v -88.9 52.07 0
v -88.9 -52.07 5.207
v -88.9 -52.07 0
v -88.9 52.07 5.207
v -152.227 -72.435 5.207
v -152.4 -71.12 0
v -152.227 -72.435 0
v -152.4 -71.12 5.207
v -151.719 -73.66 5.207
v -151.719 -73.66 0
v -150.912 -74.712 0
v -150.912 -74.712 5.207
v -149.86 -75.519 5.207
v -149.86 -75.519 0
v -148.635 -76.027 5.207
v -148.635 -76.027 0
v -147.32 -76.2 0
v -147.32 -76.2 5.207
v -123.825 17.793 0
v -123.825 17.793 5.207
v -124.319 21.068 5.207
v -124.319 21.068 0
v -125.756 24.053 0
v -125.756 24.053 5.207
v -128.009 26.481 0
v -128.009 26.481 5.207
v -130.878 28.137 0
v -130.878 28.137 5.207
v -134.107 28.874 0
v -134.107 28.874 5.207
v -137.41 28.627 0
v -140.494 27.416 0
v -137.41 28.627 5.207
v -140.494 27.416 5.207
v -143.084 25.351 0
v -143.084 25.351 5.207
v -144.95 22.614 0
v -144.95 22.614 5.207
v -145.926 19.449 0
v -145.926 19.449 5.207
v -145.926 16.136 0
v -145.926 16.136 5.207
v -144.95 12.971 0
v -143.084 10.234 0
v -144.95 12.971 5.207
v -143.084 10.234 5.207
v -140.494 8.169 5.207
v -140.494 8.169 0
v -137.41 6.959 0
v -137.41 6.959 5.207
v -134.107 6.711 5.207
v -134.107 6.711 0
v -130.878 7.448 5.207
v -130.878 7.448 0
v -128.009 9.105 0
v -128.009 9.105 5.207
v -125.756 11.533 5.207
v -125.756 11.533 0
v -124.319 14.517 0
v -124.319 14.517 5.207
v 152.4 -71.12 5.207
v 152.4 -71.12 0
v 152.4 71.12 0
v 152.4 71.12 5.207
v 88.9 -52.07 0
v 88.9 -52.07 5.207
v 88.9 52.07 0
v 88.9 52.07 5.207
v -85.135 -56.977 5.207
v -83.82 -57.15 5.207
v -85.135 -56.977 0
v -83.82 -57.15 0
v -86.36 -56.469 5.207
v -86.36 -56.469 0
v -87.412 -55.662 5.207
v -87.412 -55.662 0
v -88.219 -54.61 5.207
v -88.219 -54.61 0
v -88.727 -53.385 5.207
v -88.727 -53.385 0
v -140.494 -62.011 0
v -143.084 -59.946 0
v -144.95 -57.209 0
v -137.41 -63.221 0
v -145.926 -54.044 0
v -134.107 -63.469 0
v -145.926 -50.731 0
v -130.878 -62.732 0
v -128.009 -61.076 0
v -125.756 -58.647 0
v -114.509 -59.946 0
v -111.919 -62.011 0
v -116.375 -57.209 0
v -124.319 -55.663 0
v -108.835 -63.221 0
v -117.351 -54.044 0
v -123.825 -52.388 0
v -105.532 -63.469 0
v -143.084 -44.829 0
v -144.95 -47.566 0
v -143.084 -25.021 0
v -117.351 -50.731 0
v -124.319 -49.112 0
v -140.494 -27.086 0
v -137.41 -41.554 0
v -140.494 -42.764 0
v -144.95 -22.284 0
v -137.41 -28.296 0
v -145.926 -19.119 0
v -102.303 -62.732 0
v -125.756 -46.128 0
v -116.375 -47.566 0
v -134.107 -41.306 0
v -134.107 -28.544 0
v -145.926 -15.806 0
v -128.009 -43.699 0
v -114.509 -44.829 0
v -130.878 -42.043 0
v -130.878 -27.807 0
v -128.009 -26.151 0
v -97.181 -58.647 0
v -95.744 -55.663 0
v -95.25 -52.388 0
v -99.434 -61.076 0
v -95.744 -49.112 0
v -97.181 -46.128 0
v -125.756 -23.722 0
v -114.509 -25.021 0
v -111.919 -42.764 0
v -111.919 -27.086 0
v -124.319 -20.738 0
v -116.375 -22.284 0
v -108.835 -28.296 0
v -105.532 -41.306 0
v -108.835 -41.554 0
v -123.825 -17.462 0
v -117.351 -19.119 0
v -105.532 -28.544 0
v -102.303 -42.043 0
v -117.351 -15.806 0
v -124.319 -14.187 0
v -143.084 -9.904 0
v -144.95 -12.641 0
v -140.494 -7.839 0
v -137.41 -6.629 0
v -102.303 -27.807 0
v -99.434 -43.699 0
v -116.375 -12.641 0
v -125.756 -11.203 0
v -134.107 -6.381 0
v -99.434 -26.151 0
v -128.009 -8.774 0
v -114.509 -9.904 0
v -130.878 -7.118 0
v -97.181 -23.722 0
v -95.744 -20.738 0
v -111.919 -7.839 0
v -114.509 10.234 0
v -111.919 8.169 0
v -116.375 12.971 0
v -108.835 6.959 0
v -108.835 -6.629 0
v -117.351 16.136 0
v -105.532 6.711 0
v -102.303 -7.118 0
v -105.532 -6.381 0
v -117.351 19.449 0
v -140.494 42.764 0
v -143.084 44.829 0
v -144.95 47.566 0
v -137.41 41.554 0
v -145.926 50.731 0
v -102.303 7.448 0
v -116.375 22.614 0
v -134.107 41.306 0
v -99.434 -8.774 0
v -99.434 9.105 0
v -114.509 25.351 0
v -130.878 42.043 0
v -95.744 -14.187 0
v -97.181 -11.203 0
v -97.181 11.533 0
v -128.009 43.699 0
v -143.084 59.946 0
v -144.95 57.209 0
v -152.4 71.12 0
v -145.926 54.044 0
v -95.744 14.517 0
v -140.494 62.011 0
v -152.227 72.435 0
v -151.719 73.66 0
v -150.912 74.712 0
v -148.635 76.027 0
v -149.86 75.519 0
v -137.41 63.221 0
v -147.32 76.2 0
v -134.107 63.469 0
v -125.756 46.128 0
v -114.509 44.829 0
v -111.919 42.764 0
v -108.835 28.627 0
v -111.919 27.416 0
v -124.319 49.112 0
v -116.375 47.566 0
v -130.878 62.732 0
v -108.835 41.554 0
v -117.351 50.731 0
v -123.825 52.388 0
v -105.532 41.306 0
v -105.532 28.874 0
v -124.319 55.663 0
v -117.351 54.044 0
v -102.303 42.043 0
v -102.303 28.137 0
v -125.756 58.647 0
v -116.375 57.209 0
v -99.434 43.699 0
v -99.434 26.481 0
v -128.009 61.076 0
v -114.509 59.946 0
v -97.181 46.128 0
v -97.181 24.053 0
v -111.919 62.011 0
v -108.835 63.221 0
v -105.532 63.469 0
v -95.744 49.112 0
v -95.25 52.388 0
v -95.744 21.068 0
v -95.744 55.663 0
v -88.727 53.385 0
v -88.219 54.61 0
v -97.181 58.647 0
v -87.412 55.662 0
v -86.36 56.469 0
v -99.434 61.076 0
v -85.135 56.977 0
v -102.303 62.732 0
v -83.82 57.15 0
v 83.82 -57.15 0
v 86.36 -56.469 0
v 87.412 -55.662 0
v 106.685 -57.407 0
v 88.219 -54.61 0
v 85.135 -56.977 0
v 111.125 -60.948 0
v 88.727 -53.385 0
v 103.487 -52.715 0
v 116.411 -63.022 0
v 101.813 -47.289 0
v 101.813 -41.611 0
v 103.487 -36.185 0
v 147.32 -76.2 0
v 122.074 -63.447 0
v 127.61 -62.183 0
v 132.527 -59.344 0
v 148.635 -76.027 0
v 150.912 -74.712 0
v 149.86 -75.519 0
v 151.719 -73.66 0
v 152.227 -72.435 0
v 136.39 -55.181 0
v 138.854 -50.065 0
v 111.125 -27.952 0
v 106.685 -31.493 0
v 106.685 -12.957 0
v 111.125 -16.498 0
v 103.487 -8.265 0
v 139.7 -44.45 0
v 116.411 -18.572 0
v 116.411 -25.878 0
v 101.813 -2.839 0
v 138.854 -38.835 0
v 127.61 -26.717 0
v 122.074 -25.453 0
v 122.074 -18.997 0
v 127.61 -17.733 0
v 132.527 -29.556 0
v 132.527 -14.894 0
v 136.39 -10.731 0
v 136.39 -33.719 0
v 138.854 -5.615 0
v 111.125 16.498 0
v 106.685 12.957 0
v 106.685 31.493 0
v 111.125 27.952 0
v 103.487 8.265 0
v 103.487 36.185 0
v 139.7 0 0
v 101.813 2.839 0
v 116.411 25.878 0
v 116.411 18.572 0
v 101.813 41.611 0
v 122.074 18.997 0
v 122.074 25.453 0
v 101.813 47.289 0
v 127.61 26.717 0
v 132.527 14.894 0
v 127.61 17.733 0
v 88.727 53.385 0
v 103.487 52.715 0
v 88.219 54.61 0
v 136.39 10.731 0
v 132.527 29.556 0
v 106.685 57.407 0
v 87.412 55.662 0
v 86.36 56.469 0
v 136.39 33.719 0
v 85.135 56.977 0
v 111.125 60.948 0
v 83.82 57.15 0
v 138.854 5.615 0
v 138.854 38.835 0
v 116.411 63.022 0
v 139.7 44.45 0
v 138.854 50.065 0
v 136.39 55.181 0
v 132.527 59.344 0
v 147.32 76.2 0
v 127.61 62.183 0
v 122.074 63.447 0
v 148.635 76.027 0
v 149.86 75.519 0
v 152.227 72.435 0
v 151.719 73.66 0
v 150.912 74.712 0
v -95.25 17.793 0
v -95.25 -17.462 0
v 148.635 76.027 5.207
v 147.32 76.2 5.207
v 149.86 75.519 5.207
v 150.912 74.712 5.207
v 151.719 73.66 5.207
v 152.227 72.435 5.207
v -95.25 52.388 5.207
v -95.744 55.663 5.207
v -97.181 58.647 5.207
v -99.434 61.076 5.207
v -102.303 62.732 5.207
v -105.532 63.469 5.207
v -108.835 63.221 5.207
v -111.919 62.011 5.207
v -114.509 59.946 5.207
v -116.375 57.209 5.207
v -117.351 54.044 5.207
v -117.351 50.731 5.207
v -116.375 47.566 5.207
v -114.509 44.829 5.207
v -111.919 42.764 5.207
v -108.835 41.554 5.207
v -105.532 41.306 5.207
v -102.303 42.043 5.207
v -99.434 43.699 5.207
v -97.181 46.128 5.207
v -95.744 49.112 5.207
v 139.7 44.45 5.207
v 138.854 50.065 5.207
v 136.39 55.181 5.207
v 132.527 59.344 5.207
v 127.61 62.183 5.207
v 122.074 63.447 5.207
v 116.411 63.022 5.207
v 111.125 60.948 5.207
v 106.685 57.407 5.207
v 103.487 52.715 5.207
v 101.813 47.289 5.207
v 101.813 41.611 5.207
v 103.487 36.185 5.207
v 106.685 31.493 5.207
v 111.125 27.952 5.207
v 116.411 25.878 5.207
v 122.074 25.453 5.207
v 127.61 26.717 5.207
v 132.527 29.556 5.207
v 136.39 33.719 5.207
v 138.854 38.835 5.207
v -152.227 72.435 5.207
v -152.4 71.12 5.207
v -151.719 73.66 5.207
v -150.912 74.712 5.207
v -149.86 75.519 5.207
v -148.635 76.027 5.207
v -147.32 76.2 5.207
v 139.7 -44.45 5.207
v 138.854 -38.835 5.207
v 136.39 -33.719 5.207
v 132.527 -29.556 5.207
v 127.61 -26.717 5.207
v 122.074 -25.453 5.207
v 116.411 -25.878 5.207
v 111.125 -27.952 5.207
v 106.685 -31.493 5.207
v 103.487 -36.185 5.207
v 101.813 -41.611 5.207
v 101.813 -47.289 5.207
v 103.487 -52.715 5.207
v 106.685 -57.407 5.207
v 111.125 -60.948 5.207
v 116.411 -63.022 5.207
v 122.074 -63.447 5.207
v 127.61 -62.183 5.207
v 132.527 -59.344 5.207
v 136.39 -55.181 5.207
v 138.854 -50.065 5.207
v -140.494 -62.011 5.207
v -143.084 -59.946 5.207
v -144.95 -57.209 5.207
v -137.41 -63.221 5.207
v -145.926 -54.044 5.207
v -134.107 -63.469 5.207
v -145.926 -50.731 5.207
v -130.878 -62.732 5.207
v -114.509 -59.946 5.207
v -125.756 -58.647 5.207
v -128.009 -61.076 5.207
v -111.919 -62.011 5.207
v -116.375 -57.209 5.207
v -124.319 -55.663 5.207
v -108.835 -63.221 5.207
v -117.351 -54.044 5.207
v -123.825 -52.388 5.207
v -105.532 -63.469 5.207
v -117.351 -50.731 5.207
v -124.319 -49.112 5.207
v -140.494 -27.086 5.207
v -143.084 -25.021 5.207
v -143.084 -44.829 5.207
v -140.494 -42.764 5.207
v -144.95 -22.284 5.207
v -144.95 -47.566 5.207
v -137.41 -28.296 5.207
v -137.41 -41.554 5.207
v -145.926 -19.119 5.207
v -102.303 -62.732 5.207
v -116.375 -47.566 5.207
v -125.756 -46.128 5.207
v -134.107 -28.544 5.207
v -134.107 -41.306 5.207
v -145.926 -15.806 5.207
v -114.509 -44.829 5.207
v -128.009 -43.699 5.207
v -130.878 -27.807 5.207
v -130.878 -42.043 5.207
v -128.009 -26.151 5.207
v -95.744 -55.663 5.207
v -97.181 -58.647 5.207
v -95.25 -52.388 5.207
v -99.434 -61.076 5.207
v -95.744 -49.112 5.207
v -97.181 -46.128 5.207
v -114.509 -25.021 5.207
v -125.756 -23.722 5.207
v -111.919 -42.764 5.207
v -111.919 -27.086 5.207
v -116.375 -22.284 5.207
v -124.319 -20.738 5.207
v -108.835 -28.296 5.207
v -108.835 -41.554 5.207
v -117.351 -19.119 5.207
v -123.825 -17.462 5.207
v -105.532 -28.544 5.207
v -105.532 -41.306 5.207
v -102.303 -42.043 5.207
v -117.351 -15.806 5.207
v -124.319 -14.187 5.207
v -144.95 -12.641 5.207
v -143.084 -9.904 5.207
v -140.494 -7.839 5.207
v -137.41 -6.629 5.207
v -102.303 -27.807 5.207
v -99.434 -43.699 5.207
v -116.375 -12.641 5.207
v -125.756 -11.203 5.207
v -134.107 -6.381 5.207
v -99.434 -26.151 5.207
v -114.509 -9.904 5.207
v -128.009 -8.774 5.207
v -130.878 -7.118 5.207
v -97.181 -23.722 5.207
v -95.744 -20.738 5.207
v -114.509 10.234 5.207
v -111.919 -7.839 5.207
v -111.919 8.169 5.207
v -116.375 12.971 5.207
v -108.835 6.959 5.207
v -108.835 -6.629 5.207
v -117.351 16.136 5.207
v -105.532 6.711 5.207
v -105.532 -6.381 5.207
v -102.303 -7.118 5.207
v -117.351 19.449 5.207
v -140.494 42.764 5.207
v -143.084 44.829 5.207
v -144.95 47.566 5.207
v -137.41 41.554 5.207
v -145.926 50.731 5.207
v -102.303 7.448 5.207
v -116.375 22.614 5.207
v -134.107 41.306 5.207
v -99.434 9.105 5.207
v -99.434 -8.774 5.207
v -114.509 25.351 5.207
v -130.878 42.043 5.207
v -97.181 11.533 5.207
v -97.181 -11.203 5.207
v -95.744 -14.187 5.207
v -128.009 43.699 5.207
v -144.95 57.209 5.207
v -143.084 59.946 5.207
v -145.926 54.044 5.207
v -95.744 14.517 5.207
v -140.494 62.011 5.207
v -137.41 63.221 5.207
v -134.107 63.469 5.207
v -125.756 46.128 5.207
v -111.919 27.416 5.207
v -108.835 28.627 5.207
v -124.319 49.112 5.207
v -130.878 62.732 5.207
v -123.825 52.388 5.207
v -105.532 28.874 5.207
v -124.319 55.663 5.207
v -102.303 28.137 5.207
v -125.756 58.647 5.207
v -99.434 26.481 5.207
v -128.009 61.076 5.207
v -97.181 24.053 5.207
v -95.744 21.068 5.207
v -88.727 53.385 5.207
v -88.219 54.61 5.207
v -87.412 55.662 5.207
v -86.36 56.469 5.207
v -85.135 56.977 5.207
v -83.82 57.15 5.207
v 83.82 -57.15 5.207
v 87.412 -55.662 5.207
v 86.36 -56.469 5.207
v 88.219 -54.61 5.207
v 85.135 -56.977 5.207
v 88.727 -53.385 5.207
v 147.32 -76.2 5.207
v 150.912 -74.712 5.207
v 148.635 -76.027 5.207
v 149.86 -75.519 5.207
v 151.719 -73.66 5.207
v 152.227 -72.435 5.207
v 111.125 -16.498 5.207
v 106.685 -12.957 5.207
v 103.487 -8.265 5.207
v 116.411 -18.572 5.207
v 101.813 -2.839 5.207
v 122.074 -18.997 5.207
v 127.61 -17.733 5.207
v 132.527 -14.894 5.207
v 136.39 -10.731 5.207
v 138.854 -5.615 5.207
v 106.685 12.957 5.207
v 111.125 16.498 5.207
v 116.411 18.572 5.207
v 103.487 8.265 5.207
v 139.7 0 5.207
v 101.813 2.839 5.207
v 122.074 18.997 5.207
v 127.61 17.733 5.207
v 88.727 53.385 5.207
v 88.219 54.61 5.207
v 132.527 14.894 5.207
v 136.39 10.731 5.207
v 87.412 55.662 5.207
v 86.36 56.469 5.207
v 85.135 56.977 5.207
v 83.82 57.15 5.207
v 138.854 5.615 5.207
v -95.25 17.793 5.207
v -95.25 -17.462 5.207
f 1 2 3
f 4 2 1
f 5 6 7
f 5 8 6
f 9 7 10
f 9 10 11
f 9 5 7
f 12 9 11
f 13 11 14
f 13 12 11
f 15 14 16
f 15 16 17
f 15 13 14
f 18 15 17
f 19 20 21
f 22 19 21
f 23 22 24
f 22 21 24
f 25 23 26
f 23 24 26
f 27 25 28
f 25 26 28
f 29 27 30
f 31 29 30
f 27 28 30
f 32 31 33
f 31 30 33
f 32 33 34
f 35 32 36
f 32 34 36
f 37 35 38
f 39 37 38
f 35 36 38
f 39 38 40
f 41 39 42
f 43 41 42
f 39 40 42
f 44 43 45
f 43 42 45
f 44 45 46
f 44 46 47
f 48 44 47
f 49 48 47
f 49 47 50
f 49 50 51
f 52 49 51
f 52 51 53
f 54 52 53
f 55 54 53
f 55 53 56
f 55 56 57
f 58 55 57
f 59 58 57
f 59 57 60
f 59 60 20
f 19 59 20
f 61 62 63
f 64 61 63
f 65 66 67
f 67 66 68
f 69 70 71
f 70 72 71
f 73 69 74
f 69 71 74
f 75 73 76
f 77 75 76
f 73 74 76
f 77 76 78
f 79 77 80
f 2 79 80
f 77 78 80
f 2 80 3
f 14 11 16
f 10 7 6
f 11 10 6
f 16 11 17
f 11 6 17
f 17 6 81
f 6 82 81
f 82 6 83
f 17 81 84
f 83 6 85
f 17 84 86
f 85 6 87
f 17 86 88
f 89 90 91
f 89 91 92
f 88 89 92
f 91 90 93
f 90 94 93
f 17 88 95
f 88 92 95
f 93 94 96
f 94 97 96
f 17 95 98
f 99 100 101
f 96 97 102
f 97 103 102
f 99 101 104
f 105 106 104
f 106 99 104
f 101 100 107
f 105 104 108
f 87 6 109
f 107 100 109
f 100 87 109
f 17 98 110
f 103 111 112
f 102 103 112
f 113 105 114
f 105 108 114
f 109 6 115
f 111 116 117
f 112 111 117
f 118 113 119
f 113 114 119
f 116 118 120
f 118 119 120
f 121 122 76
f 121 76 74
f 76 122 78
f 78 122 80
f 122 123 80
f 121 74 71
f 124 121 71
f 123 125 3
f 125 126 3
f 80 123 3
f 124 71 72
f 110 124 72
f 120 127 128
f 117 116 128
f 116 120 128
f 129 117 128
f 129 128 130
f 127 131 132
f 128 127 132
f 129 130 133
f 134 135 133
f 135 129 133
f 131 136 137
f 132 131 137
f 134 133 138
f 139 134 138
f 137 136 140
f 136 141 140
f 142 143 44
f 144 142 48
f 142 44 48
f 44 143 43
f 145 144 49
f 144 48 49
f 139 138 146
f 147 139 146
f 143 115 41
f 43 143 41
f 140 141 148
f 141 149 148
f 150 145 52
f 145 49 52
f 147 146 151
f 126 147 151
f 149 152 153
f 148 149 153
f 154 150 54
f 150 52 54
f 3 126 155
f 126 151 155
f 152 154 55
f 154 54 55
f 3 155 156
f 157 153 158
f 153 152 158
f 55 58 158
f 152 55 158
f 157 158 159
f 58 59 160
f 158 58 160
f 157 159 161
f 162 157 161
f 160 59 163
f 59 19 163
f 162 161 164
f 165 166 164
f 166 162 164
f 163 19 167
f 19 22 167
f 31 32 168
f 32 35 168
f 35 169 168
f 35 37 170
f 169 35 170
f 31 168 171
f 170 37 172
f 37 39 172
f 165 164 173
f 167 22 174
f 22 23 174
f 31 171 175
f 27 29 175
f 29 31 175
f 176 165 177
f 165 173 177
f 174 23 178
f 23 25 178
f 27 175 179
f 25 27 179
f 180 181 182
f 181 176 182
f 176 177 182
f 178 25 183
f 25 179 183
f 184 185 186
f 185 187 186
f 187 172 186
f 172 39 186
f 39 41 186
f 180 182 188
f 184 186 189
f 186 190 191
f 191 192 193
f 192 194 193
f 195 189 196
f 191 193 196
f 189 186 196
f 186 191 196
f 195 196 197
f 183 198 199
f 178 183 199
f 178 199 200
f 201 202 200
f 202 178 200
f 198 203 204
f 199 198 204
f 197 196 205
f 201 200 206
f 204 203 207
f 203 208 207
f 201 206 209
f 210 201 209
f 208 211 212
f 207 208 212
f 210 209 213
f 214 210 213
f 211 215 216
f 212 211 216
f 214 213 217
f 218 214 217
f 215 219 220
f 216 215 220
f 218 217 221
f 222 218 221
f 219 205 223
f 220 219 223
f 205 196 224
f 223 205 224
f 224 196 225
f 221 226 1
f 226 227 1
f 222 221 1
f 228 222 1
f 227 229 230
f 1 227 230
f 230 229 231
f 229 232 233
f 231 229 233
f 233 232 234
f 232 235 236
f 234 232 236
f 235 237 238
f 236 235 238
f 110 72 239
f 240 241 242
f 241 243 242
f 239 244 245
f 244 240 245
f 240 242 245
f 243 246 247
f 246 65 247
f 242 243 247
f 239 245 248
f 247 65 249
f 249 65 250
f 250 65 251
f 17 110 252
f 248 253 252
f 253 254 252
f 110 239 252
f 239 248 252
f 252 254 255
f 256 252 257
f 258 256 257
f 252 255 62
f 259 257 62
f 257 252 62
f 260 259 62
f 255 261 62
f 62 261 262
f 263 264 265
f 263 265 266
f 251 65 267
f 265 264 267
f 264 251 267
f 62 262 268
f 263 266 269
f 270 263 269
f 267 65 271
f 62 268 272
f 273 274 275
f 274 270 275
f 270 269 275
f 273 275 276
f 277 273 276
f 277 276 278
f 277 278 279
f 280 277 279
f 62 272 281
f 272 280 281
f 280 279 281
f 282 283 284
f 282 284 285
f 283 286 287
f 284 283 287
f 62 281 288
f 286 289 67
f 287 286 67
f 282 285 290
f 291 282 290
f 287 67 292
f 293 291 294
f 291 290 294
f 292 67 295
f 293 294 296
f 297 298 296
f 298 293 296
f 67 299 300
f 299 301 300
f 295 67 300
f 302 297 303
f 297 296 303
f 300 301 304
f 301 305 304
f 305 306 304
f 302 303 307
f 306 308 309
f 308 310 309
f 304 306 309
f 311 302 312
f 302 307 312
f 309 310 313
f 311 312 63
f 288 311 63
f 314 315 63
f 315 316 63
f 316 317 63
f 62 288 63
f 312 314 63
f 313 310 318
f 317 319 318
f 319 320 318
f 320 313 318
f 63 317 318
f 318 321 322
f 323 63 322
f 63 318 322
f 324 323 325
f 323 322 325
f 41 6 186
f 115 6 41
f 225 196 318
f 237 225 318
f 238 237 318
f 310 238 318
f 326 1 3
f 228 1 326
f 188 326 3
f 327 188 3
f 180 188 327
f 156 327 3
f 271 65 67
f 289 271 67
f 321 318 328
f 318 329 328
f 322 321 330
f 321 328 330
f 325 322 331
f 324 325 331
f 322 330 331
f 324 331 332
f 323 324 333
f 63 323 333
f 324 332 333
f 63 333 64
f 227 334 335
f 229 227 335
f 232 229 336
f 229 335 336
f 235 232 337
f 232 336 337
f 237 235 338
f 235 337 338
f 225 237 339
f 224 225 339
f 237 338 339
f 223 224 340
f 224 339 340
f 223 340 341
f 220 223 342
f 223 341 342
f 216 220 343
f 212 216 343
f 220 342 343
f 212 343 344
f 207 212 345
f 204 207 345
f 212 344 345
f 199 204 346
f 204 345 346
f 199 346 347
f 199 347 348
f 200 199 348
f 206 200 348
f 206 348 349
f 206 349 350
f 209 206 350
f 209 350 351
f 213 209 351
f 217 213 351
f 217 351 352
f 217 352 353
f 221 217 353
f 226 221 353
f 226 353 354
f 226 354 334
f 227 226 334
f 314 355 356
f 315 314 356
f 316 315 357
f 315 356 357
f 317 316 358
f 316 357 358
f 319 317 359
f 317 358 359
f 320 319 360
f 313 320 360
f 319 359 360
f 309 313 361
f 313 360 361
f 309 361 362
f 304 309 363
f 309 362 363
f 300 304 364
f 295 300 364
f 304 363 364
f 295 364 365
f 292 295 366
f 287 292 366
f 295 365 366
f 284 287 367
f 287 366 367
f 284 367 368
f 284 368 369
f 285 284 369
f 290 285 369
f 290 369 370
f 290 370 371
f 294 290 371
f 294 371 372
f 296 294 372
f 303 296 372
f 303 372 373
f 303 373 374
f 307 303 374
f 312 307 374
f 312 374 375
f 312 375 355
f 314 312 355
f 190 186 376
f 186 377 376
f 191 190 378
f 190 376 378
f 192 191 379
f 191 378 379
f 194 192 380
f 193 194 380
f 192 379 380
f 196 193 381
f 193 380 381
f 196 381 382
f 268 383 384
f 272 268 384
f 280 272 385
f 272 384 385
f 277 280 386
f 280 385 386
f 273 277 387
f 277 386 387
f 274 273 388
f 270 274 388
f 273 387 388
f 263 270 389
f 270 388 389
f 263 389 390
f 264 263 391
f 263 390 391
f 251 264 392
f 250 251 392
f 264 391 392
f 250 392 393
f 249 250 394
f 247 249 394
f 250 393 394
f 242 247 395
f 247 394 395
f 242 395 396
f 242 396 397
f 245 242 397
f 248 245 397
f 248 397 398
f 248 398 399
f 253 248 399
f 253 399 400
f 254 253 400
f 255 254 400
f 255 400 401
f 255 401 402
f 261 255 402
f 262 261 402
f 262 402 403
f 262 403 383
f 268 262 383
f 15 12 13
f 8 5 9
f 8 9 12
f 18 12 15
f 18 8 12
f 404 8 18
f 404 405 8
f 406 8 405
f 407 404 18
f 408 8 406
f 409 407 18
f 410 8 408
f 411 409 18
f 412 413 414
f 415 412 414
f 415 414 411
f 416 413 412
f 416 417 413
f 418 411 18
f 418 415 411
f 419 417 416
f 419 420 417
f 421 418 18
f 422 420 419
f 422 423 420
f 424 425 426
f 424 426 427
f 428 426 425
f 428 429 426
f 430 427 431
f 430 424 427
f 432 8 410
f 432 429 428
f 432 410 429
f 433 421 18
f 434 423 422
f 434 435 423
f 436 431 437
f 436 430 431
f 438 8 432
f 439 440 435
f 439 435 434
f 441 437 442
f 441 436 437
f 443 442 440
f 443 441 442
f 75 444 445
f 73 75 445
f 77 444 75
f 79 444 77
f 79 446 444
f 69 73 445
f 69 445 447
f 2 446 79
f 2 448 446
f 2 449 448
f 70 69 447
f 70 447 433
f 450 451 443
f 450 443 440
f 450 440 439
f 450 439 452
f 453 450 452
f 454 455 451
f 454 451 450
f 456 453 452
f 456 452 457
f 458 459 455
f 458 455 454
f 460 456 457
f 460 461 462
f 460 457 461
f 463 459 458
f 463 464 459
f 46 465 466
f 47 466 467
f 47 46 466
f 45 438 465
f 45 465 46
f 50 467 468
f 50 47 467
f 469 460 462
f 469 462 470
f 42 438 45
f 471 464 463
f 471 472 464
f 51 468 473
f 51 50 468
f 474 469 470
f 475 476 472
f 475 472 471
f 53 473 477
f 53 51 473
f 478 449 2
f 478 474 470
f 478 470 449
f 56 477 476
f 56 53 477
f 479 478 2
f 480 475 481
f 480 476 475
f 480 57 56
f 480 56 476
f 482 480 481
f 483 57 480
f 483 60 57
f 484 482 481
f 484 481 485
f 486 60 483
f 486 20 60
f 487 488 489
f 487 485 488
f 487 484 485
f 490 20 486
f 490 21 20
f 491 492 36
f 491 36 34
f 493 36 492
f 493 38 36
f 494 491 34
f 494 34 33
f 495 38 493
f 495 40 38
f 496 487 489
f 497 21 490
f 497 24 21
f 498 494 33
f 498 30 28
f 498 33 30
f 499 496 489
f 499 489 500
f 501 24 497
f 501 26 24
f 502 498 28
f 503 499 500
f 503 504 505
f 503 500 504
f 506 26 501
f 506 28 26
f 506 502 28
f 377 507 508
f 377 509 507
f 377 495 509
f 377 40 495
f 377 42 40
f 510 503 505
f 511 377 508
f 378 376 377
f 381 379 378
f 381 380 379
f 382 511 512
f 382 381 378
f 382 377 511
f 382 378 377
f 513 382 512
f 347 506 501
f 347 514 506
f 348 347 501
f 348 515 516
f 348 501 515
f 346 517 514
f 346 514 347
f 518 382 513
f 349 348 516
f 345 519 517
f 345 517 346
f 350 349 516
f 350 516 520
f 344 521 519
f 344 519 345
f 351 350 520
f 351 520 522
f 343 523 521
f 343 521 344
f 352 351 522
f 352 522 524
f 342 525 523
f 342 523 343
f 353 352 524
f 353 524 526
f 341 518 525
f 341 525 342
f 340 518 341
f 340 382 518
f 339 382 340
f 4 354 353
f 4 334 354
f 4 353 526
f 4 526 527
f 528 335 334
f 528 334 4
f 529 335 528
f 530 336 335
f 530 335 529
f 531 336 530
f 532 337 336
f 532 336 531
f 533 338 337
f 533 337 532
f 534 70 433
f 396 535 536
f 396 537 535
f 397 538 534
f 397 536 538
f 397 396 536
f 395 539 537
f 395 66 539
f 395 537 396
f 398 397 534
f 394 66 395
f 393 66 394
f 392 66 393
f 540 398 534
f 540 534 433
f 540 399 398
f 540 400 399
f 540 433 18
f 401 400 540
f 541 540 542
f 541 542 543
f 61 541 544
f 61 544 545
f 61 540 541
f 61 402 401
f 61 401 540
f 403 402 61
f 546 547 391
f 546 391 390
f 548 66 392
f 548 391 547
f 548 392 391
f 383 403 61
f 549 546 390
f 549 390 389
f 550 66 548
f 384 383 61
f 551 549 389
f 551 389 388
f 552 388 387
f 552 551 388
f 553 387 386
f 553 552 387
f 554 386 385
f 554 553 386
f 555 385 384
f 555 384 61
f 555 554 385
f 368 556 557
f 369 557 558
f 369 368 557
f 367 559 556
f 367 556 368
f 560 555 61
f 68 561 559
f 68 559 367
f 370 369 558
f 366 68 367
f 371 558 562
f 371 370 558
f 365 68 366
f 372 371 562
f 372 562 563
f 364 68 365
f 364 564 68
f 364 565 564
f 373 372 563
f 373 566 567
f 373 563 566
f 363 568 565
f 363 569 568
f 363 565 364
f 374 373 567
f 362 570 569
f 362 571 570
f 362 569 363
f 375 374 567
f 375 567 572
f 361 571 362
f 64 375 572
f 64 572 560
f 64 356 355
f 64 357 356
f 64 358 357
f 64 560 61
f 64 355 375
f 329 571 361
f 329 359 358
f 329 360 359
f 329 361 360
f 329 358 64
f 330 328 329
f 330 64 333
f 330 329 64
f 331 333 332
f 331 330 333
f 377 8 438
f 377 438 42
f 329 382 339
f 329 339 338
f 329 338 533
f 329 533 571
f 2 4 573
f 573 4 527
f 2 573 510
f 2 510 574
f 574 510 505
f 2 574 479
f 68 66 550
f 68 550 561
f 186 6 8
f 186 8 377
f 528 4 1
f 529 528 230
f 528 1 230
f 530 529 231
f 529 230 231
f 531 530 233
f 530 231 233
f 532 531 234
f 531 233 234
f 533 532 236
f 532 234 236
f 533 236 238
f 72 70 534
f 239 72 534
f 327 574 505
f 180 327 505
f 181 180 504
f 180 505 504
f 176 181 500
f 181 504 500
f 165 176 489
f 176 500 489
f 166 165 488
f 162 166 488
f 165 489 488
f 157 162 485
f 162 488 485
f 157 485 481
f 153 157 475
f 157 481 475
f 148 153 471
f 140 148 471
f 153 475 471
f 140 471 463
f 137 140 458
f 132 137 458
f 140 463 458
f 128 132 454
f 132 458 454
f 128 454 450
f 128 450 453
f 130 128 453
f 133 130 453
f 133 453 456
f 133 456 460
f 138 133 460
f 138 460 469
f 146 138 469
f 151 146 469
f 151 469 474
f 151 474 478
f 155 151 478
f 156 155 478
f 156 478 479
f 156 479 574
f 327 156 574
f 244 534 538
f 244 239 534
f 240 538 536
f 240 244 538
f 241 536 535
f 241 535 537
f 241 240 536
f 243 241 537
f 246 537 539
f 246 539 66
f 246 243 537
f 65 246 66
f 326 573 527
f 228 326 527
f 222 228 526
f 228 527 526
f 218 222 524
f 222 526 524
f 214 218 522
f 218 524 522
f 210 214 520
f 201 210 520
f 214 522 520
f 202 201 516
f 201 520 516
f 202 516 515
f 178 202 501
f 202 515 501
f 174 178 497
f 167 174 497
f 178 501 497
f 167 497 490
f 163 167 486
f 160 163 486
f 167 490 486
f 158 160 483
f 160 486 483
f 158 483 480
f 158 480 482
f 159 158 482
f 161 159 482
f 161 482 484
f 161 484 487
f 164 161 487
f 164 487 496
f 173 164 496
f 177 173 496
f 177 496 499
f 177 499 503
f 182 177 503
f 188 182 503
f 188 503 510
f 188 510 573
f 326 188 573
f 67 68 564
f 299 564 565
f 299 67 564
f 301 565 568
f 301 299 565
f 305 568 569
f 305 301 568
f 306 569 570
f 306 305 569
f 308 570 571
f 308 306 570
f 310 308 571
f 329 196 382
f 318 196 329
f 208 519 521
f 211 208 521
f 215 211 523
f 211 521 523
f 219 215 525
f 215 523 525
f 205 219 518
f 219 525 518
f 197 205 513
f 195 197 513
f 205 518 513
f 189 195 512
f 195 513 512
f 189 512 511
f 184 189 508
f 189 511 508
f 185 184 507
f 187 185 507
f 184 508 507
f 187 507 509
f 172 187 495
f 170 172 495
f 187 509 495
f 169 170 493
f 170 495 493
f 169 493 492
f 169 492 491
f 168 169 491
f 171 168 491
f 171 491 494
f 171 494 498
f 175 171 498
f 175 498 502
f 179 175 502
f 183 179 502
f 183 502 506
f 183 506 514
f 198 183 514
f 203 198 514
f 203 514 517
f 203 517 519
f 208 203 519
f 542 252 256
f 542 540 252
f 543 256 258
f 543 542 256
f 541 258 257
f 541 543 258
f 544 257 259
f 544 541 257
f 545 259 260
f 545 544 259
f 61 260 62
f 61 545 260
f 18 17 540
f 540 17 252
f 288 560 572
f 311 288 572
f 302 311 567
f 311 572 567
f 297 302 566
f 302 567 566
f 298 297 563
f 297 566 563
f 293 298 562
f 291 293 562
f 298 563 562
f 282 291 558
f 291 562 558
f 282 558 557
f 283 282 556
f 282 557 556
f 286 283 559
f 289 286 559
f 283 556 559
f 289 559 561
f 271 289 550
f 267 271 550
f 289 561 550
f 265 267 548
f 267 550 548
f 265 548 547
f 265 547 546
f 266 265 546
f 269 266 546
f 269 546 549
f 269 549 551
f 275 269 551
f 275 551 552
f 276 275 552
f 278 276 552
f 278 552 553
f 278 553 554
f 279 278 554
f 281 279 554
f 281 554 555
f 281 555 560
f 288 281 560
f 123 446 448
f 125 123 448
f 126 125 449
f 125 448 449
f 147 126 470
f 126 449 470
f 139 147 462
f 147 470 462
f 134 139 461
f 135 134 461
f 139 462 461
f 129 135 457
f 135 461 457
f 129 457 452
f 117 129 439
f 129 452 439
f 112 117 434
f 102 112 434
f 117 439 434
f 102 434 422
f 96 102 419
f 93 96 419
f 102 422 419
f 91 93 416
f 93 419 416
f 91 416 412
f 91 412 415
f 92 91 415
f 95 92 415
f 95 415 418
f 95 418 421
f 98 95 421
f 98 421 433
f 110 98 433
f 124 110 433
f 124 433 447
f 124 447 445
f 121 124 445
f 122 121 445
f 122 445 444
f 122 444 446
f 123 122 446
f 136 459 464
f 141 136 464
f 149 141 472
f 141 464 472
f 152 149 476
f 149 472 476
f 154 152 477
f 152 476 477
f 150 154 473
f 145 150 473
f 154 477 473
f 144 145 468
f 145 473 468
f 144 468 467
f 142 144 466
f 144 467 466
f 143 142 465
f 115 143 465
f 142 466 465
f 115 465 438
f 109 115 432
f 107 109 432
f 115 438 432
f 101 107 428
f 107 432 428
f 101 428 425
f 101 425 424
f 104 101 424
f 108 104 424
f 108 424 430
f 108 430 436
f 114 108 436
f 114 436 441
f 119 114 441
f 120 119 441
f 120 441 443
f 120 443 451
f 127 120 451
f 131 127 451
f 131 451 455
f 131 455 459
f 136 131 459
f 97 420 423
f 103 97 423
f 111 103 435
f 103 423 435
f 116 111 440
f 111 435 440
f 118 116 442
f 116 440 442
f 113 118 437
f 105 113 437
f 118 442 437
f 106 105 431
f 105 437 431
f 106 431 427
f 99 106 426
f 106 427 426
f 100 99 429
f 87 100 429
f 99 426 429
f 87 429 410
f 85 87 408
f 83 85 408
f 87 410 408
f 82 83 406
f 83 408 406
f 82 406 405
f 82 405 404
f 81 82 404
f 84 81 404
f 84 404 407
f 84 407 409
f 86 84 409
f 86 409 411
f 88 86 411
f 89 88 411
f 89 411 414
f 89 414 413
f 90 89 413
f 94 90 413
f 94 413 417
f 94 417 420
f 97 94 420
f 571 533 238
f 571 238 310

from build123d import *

# Parameters (mm, degrees)
F0_W     = 304.8
F0_H     = 152.4
F1_DEPTH = 5.207
F2_W     = 177.8
F2_H     = 114.3
F3_DEPTH = 5.208
F4_R     = 19.05
F5_DEPTH = 5.208
F6_R     = 11.1125
F7_DEPTH = 5.208
F10_R    = 5.08
F11_R    = 5.08


with BuildPart() as f1:
    # F0 (on Top) → F1 (new body)
    with BuildSketch(Plane.XY):
        Rectangle(F0_W, F0_H)
    extrude(amount=F1_DEPTH)

    # F2 (on face) → F3 (cut, through all)
    with BuildSketch(Plane.XY.offset(5.207)):
        Rectangle(F2_W, F2_H)
    extrude(amount=-F3_DEPTH, mode=Mode.SUBTRACT)

    # F4 (on face) → F5 (cut, through all)
    with BuildSketch(Plane.XY.offset(5.207)):
        with Locations((120.65, -44.45)):
            Circle(F4_R)
        with Locations((120.65, 0)):
            Circle(F4_R)
        with Locations((120.65, 44.45)):
            Circle(F4_R)
    extrude(amount=-F5_DEPTH, mode=Mode.SUBTRACT)

    # F6 (on face) → F7 (cut, through all)
    with BuildSketch(Plane.XY.offset(5.207)):
        with Locations((-134.9375, 52.3875)):
            Circle(F6_R)
        with Locations((-106.3625, 52.3875)):
            Circle(F6_R)
        with Locations((-134.9375, 17.7927)):
            Circle(F6_R)
        with Locations((-106.3625, 17.7927)):
            Circle(F6_R)
        with Locations((-134.9375, -17.4625)):
            Circle(F6_R)
        with Locations((-106.3625, -17.4625)):
            Circle(F6_R)
        with Locations((-134.9375, -52.3875)):
            Circle(F6_R)
        with Locations((-106.3625, -52.3875)):
            Circle(F6_R)
    extrude(amount=-F7_DEPTH, mode=Mode.SUBTRACT)

    # F10
    f10_edges = [f1.edges().sort_by_distance(p)[0] for p in [
        (-152.4, -76.2, 2.6035),
        (-152.4, 76.2, 2.6035),
        (152.4, 76.2, 2.6035),
        (152.4, -76.2, 2.6035),
    ]]
    fillet(f10_edges, radius=F10_R)

    # F11
    f11_edges = [f1.edges().sort_by_distance(p)[0] for p in [
        (-88.9, 57.15, 2.6035),
        (-88.9, -57.15, 2.6035),
        (88.9, 57.15, 2.6035),
        (88.9, -57.15, 2.6035),
    ]]
    fillet(f11_edges, radius=F11_R)


with BuildPart() as f8_1:
    # F8: copy of F1
    add(f1.part)


solid = f1.part
